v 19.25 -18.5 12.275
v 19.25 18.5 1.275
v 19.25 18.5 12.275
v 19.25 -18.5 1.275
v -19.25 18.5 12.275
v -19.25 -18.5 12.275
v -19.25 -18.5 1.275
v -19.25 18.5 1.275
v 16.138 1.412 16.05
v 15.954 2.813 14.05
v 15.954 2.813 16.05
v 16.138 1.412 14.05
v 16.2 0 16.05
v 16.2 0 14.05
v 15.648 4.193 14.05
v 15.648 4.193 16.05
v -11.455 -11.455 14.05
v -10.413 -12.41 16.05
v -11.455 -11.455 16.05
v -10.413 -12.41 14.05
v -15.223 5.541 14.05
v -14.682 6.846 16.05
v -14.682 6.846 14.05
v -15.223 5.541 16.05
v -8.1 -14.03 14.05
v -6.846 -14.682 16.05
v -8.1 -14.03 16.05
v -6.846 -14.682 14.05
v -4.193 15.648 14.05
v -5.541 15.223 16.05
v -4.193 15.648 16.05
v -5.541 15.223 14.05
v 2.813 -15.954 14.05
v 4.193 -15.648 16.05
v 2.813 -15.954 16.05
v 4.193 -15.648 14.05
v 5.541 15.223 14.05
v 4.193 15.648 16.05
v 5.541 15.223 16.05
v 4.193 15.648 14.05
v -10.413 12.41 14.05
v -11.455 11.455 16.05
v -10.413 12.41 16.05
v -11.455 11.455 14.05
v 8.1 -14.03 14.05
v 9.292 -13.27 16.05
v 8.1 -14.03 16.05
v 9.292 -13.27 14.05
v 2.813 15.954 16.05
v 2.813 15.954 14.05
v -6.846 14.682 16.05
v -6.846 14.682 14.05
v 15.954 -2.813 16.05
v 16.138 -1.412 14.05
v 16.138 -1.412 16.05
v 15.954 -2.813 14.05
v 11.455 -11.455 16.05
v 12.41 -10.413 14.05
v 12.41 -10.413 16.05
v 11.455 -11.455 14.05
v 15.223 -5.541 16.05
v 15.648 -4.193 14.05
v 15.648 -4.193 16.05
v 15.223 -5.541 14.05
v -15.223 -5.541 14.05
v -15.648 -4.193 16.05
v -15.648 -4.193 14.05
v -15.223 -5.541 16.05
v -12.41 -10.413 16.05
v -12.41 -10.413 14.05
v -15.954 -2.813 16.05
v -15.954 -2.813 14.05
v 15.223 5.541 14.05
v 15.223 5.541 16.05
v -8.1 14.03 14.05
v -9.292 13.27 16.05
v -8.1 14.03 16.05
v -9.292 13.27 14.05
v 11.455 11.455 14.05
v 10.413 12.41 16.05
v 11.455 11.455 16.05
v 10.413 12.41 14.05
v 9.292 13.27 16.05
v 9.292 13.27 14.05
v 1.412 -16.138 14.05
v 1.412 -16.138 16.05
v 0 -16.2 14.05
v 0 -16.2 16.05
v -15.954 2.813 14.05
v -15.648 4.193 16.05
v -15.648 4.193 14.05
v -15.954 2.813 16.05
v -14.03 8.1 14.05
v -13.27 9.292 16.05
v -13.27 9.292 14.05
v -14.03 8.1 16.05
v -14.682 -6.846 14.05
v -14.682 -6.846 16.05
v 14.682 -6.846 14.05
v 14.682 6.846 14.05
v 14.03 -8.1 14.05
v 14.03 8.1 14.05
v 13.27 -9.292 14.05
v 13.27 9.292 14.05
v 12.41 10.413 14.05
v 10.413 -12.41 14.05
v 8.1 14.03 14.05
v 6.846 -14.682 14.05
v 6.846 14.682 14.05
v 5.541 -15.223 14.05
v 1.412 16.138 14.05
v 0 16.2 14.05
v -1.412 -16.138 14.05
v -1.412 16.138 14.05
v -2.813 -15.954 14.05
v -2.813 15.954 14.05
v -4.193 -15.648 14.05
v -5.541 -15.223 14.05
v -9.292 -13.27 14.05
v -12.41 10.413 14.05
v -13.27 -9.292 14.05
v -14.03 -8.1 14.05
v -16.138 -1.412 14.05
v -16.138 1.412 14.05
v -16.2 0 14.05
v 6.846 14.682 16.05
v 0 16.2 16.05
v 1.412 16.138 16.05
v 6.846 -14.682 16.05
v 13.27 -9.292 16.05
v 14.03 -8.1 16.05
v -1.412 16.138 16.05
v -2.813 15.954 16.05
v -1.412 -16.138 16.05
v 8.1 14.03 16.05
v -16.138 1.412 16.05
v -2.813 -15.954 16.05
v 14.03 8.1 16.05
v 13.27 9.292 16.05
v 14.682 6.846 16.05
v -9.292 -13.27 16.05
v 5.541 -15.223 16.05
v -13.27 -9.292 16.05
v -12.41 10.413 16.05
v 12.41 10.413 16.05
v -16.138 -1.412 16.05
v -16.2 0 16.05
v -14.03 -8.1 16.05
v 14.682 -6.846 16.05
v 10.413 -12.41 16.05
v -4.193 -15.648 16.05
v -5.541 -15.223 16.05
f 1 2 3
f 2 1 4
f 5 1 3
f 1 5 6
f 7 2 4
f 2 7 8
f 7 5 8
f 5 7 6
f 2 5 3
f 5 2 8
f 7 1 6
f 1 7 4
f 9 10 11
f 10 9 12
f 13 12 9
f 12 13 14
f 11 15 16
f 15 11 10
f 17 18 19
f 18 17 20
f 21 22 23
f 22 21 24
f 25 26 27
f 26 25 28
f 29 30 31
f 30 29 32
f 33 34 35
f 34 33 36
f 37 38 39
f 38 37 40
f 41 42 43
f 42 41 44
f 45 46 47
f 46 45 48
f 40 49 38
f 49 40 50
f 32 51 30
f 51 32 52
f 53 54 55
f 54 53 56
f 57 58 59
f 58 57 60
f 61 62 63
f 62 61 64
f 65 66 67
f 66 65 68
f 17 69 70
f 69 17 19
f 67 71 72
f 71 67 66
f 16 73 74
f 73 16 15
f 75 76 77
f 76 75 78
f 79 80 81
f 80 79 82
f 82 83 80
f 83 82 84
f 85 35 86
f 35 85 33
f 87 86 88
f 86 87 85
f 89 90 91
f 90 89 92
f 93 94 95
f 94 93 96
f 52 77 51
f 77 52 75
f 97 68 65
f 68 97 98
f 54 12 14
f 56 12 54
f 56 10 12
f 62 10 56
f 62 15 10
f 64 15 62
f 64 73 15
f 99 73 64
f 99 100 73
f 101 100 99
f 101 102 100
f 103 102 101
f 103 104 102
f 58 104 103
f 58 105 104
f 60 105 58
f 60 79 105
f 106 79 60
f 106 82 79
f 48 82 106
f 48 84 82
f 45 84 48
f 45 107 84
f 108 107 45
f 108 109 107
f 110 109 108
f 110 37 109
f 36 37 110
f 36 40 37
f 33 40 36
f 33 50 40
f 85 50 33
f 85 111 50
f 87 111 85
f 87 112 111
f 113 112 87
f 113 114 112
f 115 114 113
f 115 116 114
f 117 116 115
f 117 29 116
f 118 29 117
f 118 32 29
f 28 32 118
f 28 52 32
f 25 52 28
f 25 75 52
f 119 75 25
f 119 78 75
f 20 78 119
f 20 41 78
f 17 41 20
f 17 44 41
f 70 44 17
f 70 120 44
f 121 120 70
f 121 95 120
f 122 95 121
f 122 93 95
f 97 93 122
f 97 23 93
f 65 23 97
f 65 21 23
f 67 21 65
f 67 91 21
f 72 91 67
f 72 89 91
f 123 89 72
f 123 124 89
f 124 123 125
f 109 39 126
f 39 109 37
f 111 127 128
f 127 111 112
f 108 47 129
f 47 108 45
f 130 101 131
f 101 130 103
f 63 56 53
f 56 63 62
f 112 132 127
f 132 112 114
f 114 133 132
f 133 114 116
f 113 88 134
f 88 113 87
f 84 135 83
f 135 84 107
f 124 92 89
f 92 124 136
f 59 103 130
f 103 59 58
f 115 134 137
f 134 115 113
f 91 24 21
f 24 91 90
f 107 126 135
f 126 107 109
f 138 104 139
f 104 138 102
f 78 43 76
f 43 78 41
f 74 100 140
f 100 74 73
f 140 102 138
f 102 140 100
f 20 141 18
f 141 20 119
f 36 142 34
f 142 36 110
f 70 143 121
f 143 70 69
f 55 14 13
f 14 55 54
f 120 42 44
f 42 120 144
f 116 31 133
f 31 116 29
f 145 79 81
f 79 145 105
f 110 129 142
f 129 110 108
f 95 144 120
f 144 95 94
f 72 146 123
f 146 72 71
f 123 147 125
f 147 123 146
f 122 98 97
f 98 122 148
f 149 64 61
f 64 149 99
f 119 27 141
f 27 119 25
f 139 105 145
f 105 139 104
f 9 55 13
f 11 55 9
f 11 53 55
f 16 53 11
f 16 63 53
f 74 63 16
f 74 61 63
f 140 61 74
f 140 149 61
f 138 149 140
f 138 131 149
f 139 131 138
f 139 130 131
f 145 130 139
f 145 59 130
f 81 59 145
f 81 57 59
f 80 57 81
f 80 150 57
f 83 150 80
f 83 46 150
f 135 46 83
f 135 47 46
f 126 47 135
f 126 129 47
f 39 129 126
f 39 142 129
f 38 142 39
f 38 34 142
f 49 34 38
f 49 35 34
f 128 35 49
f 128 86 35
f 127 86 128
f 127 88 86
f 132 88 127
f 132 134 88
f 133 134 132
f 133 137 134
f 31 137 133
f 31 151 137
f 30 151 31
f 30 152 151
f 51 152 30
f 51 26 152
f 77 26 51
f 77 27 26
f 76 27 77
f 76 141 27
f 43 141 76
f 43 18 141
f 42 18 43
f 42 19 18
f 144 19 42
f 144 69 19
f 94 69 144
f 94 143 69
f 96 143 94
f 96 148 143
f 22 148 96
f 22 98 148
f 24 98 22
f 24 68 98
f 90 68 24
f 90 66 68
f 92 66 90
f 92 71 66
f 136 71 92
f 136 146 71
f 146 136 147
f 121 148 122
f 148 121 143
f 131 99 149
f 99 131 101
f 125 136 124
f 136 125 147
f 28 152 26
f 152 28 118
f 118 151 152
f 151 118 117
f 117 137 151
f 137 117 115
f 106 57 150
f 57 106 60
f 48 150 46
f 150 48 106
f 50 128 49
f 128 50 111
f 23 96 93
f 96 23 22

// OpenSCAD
// Mid-century modern desktop case — ESP32-2424S012 round clock
// Board: ~38.5 x 37 mm PCB, ~32.4 mm visible display, USB-C on bottom edge
//
// Orientation: display faces UP (+Z), tripod legs DOWN (-Z), USB on underside
// Print: legs on build plate, display hole facing up
// Assembly: slide module in from the bottom; USB-C exits through underside slot

/* [Board] */
pcb_w           = 38.5;
pcb_d           = 37.0;
pcb_thickness   = 11.0;
display_dia     = 32.4;
clearance       = 0.55;

/* [Case proportions] */
wall            = 2.2;
bezel_reveal    = 1.0;
body_od         = 52;
body_height     = 40;
taper_ratio     = 1.1;
collar_h        = 5;

leg_h           = 24;
leg_od          = 7;
leg_splay       = 12;
leg_inset       = 15;

/* [USB underside] */
usb_slot_w      = 14.5;
usb_slot_h      = 9;
usb_channel_h   = 6;
usb_channel_w   = 14;

/* [BOOT — back-right on PCB when display faces up] */
boot_hole_d     = 4.2;
boot_x          = 12;
boot_y          = -10;

part = "preview"; // [preview, body, all]

$fn = 72;

pocket_w        = pcb_w + clearance;
pocket_d        = pcb_d + clearance;
pocket_h        = pcb_thickness + clearance + 2;
window_d        = display_dia + 0.6;
body_od_base    = body_od * taper_ratio;
base_rim_h      = 4;
z_top           = base_rim_h + body_height;

module pcb_pocket() {
  translate([0, 0, pocket_h / 2])
    cube([pocket_w, pocket_d, pocket_h + 0.01], center = true);
}

module display_aperture() {
  translate([0, 0, z_top - 2])
    cylinder(h = collar_h + 30, d = window_d, center = false);
}

module top_bezel_collar() {
  translate([0, 0, z_top])
    difference() {
      cylinder(h = collar_h, d = body_od, center = false);
      translate([0, 0, -0.01])
        cylinder(h = collar_h + 0.02, d = window_d + bezel_reveal * 2);
    }
}

// USB at bottom of PCB (+Y back edge when module inserted)
module usb_underside() {
  translate([0, pocket_d / 2 - 5, -0.01])
    cube([usb_slot_w, usb_slot_h + 4, usb_slot_h + base_rim_h + 1], center = false);
  translate([0, body_od_base / 2 + 2, usb_channel_h / 2])
    cube([usb_channel_w, usb_channel_h + 16, usb_channel_h], center = true);
  translate([0, 0, -0.01])
    cylinder(h = base_rim_h + 1.5, d = body_od_base - 6, center = false);
}

module boot_hole() {
  translate([boot_x, boot_y, z_top * 0.45])
    rotate([0, 55, 0])
      cylinder(h = 16, d = boot_hole_d, center = true, $fn = 32);
}

module waist_groove(z) {
  translate([0, 0, z])
    rotate_extrude($fn = 120)
      translate([body_od / 2 - 0.15, 0])
        circle(r = 0.5, $fn = 14);
}

module leg(a) {
  rotate([0, 0, a])
    translate([leg_inset, 0, 0])
      rotate([leg_splay, 0, 0])
        translate([0, 0, -leg_h])
          cylinder(h = leg_h + 1, d = leg_od, $fn = 36);
}

module tripod() {
  for (a = [0, 120, 240])
    leg(a);
  for (a = [0, 120, 240])
    rotate([0, 0, a])
      translate([leg_inset, 0, -leg_h - 0.8])
        rotate([leg_splay, 0, 0])
          sphere(d = leg_od + 1.4, $fn = 24);
}

module main_shell() {
  difference() {
    union() {
      translate([0, 0, base_rim_h])
        cylinder(h = body_height, d1 = body_od_base, d2 = body_od, center = false);
      cylinder(h = base_rim_h, d = body_od_base + 3, center = false);
      top_bezel_collar();
      tripod();
    }
    pcb_pocket();
    display_aperture();
    usb_underside();
    boot_hole();
    waist_groove(base_rim_h + body_height * 0.42);
    translate([0, 0, base_rim_h + 3])
      cylinder(h = body_height, d = body_od - 2 * wall - 6, center = false);
  }
}

module preview_stand() {
  %main_shell();
  color("BurlyWood", 0.4)
    translate([0, 0, pocket_h / 2])
      cube([pcb_w, pcb_d, pcb_thickness], center = true);
  color("SteelBlue", 0.35)
    translate([0, 0, pocket_h + 1.5])
      cylinder(h = 2, d = display_dia, center = true);
}

if (part == "preview") {
  preview_stand();
} else {
  main_shell();
}
